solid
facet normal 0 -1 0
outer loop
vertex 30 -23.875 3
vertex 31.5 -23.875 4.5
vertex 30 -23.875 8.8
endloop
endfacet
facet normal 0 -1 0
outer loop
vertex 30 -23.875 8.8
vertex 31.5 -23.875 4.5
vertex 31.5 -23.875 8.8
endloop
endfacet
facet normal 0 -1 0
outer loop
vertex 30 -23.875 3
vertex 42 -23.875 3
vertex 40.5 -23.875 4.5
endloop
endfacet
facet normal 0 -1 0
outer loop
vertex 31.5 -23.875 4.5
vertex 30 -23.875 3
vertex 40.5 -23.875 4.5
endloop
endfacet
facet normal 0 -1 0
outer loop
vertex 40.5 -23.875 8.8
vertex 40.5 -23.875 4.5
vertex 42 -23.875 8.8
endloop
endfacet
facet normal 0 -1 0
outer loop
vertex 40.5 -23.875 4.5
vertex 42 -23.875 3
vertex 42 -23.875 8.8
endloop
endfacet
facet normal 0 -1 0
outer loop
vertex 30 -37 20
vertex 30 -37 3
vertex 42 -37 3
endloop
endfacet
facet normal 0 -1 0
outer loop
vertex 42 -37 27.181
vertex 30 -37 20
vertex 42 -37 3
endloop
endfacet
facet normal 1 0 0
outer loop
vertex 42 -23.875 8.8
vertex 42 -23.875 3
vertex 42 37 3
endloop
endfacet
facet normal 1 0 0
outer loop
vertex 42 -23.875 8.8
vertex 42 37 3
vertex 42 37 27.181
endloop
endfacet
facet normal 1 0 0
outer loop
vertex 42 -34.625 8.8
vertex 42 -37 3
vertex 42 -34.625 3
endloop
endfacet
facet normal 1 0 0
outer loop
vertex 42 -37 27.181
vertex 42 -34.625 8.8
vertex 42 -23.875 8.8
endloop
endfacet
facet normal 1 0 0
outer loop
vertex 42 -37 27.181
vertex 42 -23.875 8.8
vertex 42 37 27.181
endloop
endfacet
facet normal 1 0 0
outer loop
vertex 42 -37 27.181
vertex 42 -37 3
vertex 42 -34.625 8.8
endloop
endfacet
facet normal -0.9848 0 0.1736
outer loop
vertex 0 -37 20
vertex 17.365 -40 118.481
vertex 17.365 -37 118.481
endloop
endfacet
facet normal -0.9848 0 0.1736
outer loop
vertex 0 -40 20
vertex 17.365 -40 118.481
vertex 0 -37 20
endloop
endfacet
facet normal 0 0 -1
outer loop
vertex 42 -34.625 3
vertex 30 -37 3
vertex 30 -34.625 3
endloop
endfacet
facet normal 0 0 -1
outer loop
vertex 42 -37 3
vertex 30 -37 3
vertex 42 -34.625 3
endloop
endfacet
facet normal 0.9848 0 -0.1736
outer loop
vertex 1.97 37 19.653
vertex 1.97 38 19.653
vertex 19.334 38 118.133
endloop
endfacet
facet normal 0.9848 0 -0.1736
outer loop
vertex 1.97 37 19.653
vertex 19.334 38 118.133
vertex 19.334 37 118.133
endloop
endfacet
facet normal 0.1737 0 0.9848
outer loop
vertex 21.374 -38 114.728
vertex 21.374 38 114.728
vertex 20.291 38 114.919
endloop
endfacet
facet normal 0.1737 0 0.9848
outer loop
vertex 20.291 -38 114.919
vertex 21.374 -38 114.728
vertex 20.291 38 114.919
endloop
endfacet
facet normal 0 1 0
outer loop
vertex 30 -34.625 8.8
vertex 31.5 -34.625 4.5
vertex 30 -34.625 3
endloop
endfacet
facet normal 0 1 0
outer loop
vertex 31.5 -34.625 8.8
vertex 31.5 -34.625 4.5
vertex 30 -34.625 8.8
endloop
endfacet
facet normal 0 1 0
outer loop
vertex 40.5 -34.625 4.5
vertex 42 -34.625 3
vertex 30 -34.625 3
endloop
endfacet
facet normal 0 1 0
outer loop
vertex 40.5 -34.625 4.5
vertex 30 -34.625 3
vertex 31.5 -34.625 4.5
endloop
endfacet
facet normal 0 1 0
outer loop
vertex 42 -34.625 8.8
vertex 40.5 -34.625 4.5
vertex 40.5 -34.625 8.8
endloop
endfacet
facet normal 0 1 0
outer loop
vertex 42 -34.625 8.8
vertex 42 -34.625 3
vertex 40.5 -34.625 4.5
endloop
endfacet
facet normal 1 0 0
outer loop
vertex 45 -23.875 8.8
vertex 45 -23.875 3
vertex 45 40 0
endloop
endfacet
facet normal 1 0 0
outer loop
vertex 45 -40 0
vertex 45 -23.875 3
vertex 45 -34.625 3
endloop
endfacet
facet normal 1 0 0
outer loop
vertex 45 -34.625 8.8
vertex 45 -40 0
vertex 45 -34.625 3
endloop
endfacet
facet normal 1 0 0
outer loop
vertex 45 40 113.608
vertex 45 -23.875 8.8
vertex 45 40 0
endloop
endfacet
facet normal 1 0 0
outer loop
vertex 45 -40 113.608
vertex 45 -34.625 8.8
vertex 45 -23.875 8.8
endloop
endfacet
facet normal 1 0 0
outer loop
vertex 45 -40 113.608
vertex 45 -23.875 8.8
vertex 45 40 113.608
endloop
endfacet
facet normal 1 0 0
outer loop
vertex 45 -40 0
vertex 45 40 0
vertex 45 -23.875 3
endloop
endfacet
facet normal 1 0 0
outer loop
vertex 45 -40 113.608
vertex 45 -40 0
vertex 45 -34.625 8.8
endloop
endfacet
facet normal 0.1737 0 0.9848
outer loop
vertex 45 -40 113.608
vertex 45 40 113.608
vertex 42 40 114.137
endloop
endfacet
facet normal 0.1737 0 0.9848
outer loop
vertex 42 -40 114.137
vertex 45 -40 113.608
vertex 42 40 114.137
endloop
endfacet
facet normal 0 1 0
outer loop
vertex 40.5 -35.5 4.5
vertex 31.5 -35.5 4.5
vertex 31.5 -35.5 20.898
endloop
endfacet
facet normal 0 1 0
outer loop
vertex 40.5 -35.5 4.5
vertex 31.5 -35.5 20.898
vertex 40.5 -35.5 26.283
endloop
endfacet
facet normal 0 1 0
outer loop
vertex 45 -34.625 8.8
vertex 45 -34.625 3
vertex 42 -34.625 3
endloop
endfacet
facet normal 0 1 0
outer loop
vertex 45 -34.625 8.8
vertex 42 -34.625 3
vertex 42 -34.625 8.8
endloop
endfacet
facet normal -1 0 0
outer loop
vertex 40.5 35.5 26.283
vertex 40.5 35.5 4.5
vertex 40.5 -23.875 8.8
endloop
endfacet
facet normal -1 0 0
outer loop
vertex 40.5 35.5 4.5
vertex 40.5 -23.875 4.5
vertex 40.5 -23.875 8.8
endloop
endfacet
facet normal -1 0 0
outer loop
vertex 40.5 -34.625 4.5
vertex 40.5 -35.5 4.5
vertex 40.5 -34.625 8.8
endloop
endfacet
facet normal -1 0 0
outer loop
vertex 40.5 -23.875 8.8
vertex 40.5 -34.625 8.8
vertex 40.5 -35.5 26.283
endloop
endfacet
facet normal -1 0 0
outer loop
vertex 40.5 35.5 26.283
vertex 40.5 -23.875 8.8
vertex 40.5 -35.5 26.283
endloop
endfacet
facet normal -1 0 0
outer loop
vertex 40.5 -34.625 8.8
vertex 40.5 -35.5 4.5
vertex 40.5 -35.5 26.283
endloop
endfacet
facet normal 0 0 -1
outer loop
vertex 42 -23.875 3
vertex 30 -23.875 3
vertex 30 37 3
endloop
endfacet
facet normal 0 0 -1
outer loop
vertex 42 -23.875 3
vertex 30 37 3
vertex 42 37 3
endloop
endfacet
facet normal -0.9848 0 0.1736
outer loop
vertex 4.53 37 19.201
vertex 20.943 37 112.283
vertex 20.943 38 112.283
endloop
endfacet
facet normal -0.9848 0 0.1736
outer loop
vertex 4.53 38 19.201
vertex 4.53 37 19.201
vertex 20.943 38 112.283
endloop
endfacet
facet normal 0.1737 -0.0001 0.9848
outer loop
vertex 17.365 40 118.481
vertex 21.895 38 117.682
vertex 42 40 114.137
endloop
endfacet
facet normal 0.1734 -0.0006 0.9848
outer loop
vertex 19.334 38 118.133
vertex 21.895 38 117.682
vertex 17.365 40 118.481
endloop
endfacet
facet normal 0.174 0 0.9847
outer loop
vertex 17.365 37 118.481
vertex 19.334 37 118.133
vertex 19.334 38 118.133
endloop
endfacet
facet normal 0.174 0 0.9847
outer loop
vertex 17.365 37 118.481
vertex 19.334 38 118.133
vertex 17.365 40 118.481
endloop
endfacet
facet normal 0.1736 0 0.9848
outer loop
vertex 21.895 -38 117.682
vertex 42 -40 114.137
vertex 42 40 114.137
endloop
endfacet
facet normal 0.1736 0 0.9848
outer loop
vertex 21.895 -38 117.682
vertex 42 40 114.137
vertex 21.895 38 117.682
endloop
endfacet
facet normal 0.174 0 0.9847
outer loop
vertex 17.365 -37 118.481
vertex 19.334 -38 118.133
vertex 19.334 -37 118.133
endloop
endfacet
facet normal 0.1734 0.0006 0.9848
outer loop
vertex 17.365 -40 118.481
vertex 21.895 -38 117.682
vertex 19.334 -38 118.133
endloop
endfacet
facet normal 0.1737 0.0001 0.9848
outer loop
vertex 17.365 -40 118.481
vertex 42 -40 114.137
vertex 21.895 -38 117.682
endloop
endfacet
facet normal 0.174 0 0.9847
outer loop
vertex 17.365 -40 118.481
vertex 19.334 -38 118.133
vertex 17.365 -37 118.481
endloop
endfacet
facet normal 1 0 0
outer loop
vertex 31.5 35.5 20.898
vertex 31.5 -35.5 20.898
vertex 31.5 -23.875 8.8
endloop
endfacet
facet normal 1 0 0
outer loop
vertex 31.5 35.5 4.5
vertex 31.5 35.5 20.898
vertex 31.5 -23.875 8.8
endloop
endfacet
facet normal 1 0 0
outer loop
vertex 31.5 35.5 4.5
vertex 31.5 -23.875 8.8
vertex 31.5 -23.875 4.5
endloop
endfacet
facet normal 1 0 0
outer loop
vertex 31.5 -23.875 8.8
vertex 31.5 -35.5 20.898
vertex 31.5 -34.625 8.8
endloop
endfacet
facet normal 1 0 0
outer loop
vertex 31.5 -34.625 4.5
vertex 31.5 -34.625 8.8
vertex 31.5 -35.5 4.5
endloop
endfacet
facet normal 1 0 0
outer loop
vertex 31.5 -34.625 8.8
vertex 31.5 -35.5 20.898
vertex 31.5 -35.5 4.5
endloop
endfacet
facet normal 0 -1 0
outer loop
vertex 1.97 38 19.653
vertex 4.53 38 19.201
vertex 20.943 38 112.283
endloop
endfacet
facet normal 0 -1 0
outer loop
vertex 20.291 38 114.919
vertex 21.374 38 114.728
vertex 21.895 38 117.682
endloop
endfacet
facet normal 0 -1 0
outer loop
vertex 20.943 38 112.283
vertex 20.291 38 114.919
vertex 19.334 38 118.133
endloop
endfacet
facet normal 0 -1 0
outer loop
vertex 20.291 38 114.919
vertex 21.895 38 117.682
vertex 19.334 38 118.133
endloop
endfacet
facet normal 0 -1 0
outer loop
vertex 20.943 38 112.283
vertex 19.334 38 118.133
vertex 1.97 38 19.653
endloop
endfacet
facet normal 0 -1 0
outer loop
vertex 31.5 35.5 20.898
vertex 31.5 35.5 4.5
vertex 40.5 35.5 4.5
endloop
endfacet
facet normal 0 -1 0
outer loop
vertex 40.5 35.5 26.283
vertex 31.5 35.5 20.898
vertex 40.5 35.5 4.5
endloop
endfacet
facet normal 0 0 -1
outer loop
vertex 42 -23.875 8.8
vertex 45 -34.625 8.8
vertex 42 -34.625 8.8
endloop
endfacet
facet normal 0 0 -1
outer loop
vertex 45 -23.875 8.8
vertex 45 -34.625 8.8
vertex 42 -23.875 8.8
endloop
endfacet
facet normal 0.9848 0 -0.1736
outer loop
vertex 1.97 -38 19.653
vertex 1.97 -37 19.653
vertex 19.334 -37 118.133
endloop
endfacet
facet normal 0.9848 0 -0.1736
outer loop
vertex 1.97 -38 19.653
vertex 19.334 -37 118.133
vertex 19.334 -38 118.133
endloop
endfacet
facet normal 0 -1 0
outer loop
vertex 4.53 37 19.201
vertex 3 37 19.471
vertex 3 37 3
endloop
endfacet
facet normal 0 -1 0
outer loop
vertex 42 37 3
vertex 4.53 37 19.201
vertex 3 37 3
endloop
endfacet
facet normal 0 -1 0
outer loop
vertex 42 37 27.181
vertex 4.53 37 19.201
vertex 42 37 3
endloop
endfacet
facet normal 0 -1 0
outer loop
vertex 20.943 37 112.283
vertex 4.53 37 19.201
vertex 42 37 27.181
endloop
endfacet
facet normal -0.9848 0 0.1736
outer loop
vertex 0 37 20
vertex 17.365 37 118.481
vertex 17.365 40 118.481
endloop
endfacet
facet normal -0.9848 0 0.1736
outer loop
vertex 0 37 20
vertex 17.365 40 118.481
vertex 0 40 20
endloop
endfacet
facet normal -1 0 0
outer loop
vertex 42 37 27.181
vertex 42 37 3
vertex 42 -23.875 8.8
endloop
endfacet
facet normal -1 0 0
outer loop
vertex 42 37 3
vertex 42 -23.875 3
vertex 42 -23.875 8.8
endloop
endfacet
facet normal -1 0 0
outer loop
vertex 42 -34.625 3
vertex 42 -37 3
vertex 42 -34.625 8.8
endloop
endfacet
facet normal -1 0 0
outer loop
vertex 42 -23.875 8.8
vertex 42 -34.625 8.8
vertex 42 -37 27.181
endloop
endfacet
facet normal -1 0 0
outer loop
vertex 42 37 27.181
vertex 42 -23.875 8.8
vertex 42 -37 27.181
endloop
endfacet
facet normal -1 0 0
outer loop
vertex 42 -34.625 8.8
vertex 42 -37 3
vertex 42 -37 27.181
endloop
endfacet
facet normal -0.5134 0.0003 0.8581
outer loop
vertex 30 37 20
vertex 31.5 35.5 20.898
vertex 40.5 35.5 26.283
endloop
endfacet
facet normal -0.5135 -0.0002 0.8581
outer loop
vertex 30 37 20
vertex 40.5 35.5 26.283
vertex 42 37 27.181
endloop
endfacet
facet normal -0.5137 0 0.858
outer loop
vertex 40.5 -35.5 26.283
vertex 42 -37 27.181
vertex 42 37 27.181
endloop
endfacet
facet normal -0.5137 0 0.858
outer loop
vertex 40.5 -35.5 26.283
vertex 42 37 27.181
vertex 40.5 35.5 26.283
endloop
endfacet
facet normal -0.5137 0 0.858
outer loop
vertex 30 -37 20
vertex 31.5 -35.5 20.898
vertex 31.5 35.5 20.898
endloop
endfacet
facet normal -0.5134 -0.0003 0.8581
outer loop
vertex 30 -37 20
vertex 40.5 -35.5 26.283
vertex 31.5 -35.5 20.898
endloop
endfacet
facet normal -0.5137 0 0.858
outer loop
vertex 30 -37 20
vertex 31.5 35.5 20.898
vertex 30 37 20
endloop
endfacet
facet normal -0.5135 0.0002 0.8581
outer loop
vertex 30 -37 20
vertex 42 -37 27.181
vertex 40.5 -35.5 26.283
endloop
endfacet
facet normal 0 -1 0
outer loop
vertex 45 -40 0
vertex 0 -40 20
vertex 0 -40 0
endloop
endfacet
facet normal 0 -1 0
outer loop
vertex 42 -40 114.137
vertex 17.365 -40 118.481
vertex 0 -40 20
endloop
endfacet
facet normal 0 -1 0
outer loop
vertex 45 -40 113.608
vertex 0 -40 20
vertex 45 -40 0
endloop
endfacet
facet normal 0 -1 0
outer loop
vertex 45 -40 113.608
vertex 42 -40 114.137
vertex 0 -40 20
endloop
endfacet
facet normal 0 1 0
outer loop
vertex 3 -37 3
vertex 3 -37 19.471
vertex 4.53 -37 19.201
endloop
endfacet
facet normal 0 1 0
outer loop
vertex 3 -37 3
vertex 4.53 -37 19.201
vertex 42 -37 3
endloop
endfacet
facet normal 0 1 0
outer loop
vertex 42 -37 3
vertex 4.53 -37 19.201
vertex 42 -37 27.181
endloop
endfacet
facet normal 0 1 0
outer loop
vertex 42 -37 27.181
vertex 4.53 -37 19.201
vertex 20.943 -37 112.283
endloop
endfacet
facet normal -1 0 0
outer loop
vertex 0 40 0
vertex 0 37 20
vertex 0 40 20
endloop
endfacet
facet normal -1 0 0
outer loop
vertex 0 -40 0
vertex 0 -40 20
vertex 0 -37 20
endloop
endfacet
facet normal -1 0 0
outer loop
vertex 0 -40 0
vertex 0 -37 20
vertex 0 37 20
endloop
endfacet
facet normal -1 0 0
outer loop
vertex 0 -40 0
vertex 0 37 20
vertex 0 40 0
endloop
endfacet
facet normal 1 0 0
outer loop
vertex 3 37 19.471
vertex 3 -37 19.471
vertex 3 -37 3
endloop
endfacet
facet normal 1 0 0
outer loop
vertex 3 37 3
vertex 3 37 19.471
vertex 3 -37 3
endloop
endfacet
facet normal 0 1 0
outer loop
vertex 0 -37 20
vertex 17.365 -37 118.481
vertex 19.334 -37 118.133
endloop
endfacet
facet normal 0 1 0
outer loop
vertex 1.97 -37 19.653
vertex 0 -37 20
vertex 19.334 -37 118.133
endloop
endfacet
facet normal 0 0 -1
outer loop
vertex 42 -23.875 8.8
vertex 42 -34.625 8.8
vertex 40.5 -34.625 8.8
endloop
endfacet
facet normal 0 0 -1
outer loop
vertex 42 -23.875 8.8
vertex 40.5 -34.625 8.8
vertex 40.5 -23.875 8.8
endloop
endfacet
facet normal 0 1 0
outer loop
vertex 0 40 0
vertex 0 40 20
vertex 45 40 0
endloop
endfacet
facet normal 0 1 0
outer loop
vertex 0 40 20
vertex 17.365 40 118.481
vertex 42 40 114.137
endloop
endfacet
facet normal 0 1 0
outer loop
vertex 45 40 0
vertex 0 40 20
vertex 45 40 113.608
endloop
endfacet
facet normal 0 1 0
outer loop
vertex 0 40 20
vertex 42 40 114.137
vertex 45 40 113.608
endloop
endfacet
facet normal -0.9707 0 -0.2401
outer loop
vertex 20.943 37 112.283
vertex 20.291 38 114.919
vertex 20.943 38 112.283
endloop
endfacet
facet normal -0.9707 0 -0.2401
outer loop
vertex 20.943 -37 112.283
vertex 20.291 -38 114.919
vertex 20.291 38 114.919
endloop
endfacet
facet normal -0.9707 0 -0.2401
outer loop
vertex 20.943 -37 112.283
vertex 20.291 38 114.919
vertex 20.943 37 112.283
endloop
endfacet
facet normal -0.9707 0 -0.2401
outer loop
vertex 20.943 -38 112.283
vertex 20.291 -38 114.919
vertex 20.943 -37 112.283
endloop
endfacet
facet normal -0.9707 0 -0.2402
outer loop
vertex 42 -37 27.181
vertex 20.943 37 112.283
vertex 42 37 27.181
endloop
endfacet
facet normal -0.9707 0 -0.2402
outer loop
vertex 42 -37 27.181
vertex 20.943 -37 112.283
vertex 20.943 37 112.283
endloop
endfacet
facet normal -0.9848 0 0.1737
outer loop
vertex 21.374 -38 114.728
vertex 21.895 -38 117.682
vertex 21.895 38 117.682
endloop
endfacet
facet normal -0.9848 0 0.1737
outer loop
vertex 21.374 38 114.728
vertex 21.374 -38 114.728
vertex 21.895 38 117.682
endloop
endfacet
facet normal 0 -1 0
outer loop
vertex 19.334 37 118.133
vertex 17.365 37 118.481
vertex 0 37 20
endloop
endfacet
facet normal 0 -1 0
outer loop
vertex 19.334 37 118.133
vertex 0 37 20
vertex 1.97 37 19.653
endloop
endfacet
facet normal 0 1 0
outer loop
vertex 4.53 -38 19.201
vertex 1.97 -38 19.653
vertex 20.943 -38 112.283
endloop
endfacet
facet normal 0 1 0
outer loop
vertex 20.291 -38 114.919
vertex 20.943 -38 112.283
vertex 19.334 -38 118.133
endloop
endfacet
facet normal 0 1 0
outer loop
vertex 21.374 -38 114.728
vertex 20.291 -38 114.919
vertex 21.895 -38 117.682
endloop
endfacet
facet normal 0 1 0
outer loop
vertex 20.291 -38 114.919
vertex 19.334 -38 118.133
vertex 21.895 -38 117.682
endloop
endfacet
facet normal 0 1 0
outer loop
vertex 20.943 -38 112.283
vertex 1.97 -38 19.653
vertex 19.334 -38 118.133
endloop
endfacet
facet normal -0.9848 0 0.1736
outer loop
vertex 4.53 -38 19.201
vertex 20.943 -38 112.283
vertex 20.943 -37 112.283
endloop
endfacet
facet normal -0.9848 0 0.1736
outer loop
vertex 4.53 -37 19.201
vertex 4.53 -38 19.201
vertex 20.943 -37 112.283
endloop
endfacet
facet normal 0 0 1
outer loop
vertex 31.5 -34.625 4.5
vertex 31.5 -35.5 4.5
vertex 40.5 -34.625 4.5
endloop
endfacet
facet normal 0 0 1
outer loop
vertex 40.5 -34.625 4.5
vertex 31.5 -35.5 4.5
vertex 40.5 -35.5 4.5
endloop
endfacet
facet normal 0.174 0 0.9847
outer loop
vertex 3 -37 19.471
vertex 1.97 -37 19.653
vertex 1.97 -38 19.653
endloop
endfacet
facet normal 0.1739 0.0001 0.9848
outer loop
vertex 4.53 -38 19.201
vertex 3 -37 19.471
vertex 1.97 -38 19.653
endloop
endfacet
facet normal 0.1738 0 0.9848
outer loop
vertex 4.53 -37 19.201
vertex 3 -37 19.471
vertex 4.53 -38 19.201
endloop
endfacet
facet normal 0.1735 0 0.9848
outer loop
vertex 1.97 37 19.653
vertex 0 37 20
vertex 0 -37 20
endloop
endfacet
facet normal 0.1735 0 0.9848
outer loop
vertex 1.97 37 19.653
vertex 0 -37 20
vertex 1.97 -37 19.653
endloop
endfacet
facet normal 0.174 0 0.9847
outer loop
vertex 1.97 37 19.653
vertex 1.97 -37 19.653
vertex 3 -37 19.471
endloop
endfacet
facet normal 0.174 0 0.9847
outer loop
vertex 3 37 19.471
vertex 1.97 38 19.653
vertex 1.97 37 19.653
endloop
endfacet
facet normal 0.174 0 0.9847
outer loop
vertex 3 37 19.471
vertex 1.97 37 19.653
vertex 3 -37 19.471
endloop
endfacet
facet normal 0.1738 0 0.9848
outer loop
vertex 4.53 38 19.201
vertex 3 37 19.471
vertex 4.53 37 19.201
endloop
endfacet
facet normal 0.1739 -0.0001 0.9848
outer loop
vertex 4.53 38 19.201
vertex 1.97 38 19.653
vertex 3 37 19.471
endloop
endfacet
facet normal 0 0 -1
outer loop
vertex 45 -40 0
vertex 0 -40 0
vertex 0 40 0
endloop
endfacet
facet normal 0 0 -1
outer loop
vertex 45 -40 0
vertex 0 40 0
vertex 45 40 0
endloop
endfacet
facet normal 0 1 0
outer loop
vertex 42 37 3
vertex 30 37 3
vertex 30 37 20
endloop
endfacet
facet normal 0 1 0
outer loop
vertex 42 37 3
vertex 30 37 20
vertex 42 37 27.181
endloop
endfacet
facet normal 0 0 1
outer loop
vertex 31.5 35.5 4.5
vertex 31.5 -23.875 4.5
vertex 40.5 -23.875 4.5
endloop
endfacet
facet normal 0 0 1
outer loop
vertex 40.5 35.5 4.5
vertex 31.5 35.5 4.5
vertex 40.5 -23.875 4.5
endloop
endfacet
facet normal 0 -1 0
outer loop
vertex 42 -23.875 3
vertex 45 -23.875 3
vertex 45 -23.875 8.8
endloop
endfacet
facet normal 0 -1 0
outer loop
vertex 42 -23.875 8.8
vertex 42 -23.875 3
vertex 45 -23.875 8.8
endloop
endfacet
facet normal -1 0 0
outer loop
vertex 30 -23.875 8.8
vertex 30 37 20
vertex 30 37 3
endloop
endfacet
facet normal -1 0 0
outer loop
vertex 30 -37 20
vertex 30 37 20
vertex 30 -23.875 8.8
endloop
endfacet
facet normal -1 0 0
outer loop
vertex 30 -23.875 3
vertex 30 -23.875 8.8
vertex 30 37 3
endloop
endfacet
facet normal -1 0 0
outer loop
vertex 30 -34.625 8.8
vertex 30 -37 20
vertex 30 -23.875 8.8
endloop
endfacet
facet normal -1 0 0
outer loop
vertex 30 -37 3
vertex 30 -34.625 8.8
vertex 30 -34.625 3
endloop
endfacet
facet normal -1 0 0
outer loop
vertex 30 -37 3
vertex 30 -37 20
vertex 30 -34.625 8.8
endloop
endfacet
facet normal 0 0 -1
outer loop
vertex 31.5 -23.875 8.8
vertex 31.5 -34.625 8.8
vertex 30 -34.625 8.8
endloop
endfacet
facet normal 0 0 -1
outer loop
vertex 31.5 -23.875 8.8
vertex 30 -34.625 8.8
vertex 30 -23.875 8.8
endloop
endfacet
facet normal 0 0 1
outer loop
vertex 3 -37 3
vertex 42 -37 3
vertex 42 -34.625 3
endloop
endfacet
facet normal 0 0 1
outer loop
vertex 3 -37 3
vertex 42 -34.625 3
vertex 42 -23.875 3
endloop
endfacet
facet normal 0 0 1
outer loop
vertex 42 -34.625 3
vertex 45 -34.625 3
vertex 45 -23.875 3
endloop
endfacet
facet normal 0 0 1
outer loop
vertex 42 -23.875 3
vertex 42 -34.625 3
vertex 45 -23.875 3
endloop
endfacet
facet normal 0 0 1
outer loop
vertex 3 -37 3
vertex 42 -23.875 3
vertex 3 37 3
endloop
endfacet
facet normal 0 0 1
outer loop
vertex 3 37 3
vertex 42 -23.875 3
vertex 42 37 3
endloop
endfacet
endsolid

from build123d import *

# Parameters (mm, degrees)
F1_DEPTH      = 40
F2_T          = -3
F3_W          = 2
F3_H          = 74
F4_DEPTH      = 100
F5_DEPTH      = 37
F5_DEPTH_BACK = 37
F6_T          = -1.5
F7_DEPTH      = 40
F8_W          = 10.75
F8_H          = 5.8
F9_DEPTH      = 15


with BuildPart() as f1:
    # F0 (on Front) → F1 (new body, symmetric)
    with BuildSketch(Plane.XZ):
        Polygon((0, 20), (0, 0), (42, 0), (42, 3), (30, 3), (30, 20), (42, 27.1809821724), (20.2907003692, 114.9185834203), (42, 111.0906481632), (42, 114.1369279988), (17.3648177667, 118.4807753012), align=None)
        Polygon((42, 3), (42, 0), (45, 0), (45, 20), (45, 113.6079470567), (42, 114.1369279988), (42, 111.0906481632), (42, 27.1809821724), align=None)
        Polygon((30, 3), (42, 3), (42, 27.1809821724), (30, 20), align=None)
        Polygon((20.2907003692, 114.9185834203), (42, 27.1809821724), (42, 111.0906481632), align=None)
    extrude(amount=F1_DEPTH, both=True)

    # F2 (hollow: no face is removed)
    offset(amount=F2_T, mode=Mode.SUBTRACT)

    # F3 (on face) → F4 (cut)
    with BuildSketch(Plane(origin=(20.7850191999, 0, 117.8777015091), x_dir=(0.984807753, 0, -0.1736481777), z_dir=(0.1736481777, 0, 0.984807753))):
        Polygon((1.1270364467, 38), (-1.4729635533, 38), (-1.4729635533, 37), (-1.4729635533, -37), (-1.4729635533, -38), (1.1270364467, -38), align=None)
        with Locations((-2.4729635533, 0)):
            Rectangle(F3_W, F3_H)
    extrude(amount=-F4_DEPTH, mode=Mode.SUBTRACT)

    # F0 (on Front) → F7 (join, symmetric)
    with BuildSketch(Plane.XZ):
        Polygon((20.2907003692, 114.9185834203), (42, 27.1809821724), (42, 111.0906481632), align=None)
    extrude(amount=F7_DEPTH, both=True)


with BuildPart() as f5:
    # F0 (on Front) → F5 (new body, two sides)
    with BuildSketch(Plane.XZ) as f5_sk:
        Polygon((30, 3), (42, 3), (42, 27.1809821724), (30, 20), align=None)
    extrude(amount=F5_DEPTH)
    extrude(f5_sk.sketch, amount=-F5_DEPTH_BACK)

    # F6
    f6_openings = [f5.faces().sort_by_distance(p)[0] for p in [
        (36, 0, 23.590491),
    ]]
    offset(amount=F6_T, openings=f6_openings)


with BuildPart() as f9_tool:
    # F8 (on face) → F9 (new body, through all)
    with BuildSketch(Plane.YZ.offset(45)):
        with Locations((-29.25, 5.9)):
            Rectangle(F8_W, F8_H)
    extrude(amount=-F9_DEPTH)


with BuildPart() as f1_1:
    add(f1.part)

    # F9: cut by f9_tool
    add(f9_tool.part, mode=Mode.SUBTRACT)


with BuildPart() as f5_1:
    add(f5.part)

    # F9: cut by f9_tool
    add(f9_tool.part, mode=Mode.SUBTRACT)


solid = Compound([f1_1.part, f5_1.part])
